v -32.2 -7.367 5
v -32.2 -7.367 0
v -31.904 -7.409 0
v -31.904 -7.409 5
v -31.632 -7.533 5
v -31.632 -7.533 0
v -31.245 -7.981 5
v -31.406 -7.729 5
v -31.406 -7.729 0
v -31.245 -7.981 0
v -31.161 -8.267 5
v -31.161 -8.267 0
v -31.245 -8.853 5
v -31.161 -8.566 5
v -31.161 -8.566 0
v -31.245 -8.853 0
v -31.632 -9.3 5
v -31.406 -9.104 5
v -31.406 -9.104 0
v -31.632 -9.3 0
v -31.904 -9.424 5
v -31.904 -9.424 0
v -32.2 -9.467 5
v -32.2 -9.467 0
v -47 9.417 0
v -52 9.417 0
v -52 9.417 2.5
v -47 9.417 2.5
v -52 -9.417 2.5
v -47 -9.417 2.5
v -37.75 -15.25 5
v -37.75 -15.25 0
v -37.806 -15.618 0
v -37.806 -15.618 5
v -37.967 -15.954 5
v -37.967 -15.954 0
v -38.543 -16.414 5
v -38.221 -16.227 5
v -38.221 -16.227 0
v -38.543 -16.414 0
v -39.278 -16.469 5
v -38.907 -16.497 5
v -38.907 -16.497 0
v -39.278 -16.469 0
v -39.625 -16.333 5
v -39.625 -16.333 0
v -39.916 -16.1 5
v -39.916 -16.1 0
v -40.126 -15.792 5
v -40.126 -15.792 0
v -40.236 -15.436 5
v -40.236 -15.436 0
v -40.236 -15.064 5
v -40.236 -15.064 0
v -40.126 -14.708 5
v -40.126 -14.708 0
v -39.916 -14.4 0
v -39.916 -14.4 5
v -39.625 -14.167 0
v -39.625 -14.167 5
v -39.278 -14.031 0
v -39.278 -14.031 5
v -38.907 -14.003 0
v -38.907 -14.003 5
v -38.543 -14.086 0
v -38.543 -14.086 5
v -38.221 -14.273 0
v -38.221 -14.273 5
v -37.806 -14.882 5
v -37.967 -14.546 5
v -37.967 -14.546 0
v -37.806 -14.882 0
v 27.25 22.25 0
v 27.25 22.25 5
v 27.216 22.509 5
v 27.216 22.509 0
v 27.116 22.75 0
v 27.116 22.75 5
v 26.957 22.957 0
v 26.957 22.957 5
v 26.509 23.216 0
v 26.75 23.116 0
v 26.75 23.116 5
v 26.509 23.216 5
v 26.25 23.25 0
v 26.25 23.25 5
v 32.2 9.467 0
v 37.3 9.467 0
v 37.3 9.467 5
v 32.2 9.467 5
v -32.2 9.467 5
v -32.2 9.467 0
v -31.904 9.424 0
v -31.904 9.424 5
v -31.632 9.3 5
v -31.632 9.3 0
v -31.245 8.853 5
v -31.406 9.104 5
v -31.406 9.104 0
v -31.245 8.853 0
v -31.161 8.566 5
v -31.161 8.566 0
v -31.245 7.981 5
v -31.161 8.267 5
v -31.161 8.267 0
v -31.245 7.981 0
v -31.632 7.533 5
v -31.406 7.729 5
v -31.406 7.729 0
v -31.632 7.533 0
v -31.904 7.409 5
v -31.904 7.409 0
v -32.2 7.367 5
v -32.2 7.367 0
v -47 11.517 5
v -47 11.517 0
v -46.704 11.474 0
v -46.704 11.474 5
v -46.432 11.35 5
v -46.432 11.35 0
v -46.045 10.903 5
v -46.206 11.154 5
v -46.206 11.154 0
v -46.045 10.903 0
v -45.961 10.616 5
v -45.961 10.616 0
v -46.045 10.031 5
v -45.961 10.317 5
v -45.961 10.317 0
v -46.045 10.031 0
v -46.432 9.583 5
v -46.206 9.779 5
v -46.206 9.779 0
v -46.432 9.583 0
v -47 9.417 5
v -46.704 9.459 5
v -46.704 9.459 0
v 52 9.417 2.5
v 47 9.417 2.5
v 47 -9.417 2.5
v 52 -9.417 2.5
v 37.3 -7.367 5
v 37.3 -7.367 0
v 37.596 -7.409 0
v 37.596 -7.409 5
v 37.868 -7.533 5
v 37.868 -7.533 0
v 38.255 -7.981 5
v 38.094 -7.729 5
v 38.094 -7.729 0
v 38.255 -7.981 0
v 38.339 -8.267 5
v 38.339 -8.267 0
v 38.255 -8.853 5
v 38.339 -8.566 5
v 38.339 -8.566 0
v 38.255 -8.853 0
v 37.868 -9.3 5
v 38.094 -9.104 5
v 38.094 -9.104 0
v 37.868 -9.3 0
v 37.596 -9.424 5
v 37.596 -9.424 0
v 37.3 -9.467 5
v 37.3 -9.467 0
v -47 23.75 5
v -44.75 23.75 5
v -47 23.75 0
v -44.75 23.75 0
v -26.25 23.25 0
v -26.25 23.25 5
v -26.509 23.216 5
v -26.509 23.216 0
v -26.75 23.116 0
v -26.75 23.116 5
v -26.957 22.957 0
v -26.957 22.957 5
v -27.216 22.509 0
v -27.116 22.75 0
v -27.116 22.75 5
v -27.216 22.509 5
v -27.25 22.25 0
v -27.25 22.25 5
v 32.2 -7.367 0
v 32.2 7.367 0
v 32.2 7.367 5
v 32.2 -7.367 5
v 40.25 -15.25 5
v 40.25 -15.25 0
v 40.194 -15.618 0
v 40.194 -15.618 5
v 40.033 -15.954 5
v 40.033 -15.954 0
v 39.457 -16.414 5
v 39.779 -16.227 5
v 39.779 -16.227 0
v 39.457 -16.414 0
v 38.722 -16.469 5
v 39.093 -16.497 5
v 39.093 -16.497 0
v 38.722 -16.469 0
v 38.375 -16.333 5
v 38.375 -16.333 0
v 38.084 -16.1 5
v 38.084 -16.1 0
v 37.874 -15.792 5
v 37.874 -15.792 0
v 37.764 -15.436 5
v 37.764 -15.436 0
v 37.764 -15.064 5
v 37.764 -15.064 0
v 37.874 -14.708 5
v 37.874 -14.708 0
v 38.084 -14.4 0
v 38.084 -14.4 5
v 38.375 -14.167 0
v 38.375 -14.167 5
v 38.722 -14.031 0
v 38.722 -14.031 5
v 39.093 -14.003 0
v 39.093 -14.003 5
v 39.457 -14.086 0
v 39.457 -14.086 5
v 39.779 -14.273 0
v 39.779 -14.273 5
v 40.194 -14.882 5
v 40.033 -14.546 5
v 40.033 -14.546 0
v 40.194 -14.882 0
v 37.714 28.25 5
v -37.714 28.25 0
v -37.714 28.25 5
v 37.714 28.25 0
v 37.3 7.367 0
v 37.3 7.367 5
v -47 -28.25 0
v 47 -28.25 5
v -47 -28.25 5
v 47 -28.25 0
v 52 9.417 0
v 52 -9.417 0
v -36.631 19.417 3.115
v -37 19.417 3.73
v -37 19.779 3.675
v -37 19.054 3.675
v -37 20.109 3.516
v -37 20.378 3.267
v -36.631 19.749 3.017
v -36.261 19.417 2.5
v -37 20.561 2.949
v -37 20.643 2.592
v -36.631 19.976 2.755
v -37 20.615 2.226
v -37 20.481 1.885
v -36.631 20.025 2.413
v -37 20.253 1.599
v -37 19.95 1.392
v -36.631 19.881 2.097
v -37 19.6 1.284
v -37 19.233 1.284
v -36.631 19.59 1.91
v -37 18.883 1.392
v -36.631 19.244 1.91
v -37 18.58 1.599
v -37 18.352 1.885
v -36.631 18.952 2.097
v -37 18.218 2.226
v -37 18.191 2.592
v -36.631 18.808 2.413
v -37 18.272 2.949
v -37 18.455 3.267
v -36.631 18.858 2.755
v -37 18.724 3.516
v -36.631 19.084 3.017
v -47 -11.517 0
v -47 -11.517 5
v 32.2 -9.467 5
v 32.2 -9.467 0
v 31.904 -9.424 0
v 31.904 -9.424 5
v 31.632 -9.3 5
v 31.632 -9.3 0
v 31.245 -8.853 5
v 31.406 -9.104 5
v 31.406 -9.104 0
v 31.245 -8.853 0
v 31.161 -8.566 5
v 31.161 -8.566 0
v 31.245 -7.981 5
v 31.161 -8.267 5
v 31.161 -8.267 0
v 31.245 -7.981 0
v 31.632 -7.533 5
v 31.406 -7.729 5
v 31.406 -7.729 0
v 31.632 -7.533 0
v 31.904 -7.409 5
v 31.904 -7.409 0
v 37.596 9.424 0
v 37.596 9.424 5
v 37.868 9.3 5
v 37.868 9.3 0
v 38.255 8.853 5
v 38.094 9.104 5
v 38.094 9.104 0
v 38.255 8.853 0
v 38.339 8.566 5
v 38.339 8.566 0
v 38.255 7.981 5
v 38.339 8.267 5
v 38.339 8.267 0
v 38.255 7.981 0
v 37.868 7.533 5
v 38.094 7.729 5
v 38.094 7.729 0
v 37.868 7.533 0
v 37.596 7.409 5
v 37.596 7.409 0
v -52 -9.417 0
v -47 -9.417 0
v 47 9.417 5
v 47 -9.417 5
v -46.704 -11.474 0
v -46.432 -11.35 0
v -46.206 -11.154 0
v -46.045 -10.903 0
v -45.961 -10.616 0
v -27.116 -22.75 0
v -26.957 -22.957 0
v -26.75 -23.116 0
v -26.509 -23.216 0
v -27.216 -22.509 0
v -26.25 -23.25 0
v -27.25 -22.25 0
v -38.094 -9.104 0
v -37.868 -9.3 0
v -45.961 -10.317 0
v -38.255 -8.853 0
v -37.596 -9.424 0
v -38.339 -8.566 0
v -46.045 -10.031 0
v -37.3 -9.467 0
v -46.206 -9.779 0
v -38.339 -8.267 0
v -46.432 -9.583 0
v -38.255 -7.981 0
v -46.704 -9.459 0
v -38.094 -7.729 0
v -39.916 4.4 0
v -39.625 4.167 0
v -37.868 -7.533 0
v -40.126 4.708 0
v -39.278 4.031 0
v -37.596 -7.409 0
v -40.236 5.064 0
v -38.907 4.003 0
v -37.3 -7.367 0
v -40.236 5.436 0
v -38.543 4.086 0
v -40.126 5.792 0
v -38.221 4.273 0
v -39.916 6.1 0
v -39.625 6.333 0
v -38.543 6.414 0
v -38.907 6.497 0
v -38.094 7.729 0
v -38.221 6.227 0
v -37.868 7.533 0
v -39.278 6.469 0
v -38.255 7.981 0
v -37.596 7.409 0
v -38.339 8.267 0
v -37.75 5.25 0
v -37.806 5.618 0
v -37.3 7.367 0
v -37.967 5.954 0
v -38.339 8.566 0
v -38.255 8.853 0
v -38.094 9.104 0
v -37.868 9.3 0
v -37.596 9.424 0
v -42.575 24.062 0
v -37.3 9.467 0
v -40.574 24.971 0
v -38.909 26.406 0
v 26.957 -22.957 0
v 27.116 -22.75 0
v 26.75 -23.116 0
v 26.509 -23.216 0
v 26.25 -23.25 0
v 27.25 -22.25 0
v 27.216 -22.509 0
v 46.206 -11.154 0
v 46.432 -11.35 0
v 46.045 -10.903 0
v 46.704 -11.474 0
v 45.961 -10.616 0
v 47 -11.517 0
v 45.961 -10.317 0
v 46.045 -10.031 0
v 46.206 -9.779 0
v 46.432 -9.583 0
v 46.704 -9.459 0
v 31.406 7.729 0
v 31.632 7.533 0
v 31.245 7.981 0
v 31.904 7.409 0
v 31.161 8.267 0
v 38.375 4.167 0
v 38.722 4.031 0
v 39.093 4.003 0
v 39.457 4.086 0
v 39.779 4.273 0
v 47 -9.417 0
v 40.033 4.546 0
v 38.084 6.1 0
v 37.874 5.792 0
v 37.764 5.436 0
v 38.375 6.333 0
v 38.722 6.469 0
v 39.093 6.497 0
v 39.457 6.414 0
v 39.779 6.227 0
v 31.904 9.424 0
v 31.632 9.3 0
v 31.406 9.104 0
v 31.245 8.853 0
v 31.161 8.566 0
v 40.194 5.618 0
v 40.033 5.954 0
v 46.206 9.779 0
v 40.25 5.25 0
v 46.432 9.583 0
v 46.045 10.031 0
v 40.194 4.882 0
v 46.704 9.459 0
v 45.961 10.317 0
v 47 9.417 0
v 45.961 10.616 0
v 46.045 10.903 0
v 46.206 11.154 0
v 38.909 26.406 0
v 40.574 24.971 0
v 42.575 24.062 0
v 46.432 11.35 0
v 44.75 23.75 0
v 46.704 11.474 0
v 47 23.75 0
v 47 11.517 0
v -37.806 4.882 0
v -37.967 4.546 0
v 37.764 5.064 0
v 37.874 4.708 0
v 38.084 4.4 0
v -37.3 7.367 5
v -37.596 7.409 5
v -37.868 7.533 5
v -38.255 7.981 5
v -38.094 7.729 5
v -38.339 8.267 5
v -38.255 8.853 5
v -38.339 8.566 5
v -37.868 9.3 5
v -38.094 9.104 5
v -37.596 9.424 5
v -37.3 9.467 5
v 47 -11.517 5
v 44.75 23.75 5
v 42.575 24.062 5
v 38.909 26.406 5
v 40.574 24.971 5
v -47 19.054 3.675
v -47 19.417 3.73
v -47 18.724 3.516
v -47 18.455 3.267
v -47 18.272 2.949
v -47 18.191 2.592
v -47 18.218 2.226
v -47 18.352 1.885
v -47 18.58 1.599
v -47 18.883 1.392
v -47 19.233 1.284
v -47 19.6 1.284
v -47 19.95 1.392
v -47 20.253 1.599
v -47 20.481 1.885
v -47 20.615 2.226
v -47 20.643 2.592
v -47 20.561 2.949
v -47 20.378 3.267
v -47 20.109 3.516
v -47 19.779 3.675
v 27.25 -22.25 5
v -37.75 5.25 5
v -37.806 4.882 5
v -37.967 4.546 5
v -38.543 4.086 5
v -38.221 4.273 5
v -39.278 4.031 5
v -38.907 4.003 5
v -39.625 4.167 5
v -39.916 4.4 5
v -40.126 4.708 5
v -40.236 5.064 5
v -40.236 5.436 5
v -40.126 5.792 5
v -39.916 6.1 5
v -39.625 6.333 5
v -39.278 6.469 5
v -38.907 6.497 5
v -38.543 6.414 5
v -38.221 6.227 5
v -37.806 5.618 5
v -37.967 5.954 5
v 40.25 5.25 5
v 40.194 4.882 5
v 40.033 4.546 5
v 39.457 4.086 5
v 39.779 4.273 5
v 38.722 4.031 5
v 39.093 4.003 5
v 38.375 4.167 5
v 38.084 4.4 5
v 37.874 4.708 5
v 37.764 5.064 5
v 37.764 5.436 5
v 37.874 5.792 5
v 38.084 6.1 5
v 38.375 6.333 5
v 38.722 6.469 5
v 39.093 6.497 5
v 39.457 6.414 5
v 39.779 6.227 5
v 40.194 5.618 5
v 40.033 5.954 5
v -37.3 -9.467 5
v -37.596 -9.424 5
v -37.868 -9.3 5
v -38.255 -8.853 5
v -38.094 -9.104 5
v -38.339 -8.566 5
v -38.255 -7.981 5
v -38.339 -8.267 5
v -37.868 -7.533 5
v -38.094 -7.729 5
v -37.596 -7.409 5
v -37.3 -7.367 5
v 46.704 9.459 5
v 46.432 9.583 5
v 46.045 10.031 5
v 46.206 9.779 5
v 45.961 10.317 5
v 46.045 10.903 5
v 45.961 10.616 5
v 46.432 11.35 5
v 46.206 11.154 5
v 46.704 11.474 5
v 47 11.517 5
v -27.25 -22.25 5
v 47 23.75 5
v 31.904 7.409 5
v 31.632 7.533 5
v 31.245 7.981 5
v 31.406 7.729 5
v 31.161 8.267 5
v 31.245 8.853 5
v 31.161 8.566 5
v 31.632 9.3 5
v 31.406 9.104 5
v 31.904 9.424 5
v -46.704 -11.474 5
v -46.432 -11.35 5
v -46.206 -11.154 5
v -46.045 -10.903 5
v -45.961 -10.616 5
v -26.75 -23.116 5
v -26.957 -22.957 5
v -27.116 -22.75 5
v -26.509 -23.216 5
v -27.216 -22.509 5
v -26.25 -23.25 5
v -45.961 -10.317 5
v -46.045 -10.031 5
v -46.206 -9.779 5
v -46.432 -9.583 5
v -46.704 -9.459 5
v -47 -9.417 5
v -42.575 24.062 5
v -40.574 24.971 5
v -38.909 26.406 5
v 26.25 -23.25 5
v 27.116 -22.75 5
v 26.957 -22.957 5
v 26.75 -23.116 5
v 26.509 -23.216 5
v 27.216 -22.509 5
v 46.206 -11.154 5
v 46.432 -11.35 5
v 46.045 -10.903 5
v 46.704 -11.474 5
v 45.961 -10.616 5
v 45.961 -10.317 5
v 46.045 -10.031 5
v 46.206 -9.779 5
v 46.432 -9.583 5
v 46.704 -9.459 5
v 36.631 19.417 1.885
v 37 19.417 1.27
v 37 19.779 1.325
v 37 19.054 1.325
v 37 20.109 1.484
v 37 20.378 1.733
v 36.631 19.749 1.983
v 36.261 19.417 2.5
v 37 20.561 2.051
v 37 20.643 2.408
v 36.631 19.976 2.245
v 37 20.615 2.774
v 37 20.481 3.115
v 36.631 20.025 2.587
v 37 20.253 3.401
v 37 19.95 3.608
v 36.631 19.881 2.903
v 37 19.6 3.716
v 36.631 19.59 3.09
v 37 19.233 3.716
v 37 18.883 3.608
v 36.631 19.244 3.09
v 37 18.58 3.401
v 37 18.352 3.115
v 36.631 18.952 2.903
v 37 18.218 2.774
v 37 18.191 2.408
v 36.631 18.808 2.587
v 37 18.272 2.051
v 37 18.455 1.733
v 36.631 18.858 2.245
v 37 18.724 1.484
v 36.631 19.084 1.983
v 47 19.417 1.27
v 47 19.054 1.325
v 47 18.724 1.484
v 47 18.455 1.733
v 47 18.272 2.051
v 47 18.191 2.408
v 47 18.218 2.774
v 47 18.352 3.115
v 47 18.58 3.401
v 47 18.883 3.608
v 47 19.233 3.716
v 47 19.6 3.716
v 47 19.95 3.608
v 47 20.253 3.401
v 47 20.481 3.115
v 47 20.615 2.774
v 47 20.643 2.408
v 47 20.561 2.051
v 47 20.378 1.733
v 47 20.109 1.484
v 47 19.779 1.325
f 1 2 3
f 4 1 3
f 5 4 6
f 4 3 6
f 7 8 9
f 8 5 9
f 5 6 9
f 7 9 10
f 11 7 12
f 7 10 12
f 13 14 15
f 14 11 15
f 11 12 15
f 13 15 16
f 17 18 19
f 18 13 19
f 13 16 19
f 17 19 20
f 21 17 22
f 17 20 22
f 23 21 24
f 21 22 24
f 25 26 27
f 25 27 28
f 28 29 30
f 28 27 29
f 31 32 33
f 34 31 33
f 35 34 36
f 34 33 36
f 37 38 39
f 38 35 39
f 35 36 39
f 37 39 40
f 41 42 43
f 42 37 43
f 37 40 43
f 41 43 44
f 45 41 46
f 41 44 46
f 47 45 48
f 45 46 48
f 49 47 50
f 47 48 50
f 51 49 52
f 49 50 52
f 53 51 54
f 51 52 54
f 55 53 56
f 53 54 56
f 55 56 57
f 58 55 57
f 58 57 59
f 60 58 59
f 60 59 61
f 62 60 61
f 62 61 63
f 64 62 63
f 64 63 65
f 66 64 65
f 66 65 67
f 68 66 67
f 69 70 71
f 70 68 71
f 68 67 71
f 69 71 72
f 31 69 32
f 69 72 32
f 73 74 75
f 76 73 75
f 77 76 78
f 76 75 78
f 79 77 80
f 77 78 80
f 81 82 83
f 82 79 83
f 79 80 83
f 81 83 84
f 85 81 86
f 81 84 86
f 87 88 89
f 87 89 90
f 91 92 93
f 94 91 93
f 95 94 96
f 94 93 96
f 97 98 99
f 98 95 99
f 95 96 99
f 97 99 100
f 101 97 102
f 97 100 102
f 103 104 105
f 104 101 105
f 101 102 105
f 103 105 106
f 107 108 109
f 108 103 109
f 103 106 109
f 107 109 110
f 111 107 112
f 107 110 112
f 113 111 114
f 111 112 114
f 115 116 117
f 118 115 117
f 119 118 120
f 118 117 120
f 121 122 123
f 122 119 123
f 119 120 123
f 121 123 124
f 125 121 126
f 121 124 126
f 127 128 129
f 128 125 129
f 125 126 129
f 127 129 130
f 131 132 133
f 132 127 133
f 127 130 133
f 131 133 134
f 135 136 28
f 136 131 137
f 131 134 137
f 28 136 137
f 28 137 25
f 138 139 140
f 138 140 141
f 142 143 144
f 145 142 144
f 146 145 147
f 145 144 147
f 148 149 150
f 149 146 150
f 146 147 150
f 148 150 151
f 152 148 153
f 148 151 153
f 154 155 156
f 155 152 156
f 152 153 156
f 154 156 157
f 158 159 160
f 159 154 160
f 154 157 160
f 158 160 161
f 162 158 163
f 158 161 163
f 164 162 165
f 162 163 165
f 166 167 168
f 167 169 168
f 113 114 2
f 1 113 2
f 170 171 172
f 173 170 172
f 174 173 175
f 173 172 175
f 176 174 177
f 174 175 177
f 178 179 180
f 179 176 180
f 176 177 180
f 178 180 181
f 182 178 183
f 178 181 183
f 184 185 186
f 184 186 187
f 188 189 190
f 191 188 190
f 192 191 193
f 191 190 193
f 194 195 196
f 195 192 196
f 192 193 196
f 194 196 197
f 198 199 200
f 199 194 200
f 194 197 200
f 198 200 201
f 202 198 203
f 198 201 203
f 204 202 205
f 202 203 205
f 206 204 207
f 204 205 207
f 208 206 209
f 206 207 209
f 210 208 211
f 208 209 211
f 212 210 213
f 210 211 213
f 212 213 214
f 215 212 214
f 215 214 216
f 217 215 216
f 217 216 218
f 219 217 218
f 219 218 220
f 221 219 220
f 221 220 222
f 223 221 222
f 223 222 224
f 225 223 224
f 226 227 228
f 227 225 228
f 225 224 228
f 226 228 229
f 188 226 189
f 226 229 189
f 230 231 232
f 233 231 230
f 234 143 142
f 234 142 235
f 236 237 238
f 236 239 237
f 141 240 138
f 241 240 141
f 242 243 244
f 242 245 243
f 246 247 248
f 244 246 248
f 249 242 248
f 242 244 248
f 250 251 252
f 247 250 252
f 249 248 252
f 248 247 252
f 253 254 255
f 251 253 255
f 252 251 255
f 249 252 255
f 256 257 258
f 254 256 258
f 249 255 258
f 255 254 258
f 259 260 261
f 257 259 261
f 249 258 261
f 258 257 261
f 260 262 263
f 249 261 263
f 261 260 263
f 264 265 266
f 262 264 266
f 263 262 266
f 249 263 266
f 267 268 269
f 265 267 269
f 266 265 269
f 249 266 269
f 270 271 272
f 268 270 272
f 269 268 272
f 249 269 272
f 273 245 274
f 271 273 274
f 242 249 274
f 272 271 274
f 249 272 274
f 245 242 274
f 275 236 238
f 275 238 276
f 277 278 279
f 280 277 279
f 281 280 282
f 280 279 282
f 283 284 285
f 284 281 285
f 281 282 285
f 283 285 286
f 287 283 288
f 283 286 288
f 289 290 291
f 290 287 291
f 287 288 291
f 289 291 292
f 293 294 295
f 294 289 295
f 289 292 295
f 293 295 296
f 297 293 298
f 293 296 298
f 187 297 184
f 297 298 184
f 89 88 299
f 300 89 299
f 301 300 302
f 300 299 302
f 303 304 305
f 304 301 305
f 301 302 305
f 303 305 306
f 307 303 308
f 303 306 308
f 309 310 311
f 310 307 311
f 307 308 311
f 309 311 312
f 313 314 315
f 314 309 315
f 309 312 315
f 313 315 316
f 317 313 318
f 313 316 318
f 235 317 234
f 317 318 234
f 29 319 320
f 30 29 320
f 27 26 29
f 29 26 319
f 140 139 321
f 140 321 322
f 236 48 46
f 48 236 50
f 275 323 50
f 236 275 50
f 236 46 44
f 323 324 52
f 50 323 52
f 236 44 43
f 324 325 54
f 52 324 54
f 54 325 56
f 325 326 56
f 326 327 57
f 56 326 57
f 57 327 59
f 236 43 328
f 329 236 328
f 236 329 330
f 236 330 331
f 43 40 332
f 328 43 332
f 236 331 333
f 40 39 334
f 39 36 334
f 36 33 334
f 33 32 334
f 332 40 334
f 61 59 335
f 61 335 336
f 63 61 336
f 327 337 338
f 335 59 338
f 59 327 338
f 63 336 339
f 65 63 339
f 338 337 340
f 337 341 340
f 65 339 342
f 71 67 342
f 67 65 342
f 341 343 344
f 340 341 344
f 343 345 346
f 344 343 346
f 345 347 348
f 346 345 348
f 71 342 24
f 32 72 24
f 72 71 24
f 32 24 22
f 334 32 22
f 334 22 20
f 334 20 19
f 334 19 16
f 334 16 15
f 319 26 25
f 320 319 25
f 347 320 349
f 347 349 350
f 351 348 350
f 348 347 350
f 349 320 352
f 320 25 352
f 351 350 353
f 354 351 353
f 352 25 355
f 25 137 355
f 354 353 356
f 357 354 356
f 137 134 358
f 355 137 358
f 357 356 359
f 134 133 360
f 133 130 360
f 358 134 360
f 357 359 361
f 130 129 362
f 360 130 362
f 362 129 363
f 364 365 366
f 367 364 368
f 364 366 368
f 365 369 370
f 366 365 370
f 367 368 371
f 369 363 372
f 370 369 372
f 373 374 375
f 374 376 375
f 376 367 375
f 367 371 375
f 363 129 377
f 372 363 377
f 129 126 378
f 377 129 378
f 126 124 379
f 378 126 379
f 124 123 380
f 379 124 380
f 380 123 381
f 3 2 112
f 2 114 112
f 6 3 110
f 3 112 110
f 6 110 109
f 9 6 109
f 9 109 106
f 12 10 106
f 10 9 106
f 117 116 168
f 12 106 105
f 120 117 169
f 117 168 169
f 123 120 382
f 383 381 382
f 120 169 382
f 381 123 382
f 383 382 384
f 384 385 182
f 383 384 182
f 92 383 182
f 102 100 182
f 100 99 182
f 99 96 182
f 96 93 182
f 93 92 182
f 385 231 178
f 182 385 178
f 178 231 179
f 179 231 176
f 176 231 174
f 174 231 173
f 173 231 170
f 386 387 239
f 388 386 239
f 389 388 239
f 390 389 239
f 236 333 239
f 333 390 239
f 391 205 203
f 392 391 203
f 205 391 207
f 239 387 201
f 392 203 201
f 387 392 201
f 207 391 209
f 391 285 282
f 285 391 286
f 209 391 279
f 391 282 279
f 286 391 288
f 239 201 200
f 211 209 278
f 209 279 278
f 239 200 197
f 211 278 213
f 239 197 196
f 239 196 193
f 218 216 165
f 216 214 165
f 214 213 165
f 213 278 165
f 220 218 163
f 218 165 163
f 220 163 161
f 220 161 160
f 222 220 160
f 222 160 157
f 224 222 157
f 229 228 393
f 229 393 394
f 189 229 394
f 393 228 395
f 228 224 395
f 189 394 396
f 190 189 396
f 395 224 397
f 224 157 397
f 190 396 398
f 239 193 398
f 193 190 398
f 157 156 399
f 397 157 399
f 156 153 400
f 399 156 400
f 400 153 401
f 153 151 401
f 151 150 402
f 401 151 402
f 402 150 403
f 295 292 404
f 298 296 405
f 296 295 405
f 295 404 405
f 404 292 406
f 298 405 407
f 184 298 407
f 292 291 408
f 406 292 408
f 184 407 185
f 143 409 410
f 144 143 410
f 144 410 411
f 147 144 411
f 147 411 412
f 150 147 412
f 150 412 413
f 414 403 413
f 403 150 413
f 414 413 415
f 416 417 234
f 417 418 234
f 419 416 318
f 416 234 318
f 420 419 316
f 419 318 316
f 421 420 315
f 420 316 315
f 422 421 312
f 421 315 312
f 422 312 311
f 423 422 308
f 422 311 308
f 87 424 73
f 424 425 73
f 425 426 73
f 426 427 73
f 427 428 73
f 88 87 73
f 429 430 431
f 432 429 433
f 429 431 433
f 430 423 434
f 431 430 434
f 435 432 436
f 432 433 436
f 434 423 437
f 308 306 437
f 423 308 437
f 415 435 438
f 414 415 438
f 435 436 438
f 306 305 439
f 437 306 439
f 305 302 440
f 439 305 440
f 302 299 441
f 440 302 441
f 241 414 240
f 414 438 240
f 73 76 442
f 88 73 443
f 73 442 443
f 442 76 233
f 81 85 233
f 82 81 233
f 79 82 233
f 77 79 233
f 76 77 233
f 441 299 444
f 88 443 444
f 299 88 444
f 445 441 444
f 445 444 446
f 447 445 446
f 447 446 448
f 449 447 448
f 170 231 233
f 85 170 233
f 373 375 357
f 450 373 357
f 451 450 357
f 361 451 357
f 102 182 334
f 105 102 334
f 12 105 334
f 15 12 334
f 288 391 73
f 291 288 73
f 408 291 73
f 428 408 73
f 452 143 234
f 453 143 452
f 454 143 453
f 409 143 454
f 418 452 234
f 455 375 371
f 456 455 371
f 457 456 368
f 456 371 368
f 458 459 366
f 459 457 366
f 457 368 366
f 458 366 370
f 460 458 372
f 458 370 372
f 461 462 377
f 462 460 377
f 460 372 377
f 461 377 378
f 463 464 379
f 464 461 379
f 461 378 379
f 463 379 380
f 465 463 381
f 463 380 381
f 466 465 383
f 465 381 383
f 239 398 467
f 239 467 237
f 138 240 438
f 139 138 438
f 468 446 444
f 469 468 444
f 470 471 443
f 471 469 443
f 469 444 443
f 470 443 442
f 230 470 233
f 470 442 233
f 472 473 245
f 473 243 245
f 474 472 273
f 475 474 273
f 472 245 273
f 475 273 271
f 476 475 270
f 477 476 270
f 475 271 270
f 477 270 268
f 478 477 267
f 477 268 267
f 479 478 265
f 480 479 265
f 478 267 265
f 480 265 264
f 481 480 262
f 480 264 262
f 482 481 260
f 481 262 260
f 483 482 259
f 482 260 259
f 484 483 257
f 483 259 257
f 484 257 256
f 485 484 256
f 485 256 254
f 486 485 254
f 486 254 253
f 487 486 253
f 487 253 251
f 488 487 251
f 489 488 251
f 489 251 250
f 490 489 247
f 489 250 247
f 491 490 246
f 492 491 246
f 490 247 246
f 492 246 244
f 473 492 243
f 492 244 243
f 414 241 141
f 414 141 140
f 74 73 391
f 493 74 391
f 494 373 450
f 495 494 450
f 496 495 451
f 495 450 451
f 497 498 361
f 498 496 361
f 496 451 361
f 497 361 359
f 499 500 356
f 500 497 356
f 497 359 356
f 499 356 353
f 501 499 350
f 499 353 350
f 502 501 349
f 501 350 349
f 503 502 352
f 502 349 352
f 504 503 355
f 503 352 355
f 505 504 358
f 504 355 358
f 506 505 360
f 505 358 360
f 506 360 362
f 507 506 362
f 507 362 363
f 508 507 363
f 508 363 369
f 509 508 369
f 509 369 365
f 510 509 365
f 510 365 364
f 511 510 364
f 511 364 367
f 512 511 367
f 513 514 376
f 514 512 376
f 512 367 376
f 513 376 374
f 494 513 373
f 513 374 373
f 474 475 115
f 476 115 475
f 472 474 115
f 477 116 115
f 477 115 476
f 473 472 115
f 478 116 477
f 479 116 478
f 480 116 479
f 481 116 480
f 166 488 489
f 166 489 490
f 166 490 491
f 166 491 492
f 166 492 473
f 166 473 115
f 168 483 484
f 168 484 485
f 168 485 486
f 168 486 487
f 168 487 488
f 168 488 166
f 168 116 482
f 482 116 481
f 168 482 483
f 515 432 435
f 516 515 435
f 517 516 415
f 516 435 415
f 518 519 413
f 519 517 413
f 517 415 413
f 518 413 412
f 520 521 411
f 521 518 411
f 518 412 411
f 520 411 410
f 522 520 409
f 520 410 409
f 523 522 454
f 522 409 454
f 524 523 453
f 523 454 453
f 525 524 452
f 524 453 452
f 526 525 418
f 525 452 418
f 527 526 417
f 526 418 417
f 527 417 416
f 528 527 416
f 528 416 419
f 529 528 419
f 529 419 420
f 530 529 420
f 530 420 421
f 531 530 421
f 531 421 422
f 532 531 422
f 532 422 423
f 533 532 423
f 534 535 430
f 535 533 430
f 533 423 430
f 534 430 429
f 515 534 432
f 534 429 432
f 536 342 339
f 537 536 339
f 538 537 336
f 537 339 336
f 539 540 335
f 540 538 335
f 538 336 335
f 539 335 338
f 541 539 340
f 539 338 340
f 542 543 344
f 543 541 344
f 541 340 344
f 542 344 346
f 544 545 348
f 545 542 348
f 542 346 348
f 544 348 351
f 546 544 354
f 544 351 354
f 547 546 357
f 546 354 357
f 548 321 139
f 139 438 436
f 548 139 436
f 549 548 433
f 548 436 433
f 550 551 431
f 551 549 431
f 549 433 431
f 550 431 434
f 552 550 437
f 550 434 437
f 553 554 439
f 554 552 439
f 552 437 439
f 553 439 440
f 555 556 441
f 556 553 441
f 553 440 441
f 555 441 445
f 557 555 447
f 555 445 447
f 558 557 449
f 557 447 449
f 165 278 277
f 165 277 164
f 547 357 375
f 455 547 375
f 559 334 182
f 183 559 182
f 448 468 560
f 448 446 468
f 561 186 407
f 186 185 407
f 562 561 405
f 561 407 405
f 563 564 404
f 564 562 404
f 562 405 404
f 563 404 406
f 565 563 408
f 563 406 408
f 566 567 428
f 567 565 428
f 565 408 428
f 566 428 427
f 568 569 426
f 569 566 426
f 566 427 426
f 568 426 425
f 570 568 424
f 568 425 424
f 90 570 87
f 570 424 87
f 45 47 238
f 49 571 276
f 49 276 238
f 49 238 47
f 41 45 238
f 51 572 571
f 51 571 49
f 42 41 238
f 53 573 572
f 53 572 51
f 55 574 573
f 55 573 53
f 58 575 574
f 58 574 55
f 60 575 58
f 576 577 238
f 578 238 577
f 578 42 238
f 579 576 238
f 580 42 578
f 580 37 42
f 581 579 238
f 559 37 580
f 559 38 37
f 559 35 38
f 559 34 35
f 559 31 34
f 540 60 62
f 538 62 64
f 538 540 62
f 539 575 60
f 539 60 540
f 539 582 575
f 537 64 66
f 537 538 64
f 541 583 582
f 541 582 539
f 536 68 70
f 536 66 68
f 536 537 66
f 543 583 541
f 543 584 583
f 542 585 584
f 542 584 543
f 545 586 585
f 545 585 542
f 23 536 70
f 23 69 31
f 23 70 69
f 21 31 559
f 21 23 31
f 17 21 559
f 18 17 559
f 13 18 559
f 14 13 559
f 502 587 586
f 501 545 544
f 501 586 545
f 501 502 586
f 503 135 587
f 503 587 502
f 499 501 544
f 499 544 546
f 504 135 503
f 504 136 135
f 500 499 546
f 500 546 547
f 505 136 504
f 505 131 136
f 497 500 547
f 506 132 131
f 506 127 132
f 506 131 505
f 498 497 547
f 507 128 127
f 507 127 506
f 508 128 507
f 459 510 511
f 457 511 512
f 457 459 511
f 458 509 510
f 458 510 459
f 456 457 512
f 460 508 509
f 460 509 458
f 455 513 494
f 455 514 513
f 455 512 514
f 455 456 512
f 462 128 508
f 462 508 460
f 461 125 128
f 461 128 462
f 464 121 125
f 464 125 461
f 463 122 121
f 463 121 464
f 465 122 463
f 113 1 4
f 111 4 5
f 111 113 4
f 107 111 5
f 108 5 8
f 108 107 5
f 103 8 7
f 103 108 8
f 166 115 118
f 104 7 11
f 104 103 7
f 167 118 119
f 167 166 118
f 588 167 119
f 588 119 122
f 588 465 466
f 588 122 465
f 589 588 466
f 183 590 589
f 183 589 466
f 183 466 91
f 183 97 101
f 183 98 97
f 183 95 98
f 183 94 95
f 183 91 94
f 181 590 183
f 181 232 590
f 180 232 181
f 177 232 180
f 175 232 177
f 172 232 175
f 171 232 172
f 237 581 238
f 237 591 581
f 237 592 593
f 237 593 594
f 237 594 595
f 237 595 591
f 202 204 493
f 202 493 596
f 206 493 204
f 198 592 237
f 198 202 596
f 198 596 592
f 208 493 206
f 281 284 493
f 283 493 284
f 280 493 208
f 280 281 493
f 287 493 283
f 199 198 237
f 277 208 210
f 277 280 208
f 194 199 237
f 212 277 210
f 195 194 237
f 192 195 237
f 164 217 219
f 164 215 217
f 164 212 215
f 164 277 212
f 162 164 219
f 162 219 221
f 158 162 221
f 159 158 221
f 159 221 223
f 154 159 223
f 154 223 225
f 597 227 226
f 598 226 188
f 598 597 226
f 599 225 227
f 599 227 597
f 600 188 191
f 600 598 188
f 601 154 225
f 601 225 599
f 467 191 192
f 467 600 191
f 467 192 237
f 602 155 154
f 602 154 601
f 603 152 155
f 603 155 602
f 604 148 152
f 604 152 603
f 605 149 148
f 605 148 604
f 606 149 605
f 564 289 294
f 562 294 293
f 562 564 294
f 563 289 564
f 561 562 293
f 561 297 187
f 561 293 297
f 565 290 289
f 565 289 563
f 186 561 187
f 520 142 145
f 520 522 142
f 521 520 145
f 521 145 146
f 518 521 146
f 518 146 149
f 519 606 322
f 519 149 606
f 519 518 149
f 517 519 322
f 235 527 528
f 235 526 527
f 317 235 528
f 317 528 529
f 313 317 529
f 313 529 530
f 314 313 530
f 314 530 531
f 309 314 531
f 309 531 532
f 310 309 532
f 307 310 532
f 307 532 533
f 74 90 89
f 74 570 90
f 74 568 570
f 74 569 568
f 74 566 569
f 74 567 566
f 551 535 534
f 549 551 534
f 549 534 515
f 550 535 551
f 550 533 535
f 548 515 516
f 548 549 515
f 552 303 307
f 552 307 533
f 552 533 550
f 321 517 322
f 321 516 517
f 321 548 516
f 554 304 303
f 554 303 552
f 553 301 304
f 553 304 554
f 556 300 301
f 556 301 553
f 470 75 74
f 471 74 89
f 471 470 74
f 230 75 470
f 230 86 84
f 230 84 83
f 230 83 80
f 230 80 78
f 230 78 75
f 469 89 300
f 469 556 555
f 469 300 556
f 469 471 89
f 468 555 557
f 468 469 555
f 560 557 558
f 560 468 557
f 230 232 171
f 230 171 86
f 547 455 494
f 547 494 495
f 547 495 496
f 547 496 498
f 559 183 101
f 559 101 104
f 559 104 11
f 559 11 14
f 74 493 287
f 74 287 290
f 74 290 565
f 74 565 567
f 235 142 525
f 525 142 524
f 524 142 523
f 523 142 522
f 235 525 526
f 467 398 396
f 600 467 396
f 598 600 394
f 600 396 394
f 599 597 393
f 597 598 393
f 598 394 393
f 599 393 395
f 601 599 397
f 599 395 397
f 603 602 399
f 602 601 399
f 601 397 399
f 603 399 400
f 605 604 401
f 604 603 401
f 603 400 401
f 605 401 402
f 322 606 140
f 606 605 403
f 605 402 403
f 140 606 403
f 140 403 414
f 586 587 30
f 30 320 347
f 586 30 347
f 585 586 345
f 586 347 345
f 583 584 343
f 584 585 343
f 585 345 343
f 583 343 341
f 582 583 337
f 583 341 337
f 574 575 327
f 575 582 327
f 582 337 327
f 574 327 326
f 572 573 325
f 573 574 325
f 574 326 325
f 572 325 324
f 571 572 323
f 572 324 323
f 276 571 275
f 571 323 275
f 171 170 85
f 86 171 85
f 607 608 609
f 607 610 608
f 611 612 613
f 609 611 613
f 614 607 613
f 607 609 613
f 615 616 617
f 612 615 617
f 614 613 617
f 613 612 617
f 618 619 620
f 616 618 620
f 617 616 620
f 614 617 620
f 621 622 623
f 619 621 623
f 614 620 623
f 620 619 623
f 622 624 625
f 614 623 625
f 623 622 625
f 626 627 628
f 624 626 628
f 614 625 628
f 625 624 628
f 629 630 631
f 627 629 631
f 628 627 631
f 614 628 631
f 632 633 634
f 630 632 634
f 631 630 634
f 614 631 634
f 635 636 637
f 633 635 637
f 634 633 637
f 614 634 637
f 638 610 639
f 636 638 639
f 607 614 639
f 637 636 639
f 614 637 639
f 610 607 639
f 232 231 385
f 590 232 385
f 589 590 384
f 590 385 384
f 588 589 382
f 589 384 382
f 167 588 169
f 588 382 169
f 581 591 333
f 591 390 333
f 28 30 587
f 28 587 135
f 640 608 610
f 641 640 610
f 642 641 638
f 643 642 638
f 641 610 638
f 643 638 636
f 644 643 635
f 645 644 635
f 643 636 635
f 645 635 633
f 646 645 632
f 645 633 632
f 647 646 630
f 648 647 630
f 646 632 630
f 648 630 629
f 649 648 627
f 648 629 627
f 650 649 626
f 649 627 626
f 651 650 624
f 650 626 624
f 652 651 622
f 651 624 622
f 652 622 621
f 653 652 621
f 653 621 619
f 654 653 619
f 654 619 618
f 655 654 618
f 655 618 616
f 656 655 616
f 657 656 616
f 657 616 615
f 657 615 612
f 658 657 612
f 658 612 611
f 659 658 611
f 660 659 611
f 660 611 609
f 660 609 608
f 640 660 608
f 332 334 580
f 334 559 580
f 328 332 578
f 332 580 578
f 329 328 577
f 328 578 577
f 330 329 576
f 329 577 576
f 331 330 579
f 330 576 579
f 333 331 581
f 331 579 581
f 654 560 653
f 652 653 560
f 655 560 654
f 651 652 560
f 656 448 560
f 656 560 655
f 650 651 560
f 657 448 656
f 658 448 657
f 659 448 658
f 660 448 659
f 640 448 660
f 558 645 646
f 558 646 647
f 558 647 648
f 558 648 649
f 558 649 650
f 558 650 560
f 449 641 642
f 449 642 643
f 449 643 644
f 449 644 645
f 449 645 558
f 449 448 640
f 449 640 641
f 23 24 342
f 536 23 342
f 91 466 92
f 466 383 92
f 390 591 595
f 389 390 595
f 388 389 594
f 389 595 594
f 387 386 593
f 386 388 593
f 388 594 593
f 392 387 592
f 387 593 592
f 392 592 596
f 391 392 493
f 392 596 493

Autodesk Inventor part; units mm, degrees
ref_plane "YZ Plane" through (0, 0, 0) normal (1, 0, 0) x (0, 1, 0)
ref_plane "XZ Plane" through (0, 0, 0) normal (0, 1, 0) x (-1, 0, 0)
ref_plane "XY Plane" through (0, 0, 0) normal (0, 0, 1) x (1, 0, 0)
sketch "スケッチ1" plane through (0, 0, 0) normal (0, 0, 1) x (1, 0, 0)
  line L0 (-47, 28.25) -> (-37.7144, 28.25)
  line L1 (47, 28.25) -> (47, 23.75)
  line L2 (47, -28.25) -> (-47, -28.25)
  line L3 (-47, -28.25) -> (-47, -11.5167)
  line L4 (-47, 28.25) -> (47, -28.25) construction
  line L5 (47, 28.25) -> (-47, -28.25) construction
  line L6 (0, 28.25) -> (0, -28.25) construction
  line L7 (-37.25, 9.4167) -> (-32.25, 9.4167) construction
  line L8 (-32.25, 9.4167) -> (-32.25, -9.4167) construction
  line L9 (-32.25, -9.4167) -> (-37.25, -9.4167) construction
  line L10 (-37.25, -9.4167) -> (-37.25, 9.4167) construction
  line L11 (-37.25, 9.4167) -> (-32.25, -9.4167) construction
  line L12 (-32.25, 9.4167) -> (-37.25, -9.4167) construction
  line L13 (-37.3, 9.4667) -> (-32.2, 9.4667)
  line L14 (-32.2, 9.4667) -> (-32.2, 7.3667) construction
  line L15 (-32.2, -9.4667) -> (-37.3, -9.4667)
  line L16 (-37.3, -9.4667) -> (-37.3, -7.3667) construction
  line L17 (-37.3, 9.4667) -> (-32.2, -9.4667) construction
  line L18 (-32.2, 9.4667) -> (-37.3, -9.4667) construction
  arc A0 (-37.3, 9.4667) -> (-37.3, 7.3667) centre (-37.3, 8.4167) ccw
  line L19 (-34.75, 9.4667) -> (-34.75, -9.4667) construction
  arc A1 (-32.2, 7.3667) -> (-32.2, 9.4667) centre (-32.2, 8.4167) ccw
  line L20 (-37.3, 7.3667) -> (-37.3, 9.4667) construction
  line L21 (-32.2, 7.3667) -> (-32.2, -7.3667)
  line L22 (-37.3, -7.3667) -> (-37.3, 7.3667)
  line L23 (-32.2, -7.3667) -> (-32.2, -9.4667) construction
  line L24 (37.25, 9.4167) -> (32.25, 9.4167) construction
  line L25 (32.25, 9.4167) -> (32.25, -9.4167) construction
  line L26 (32.25, -9.4167) -> (37.25, -9.4167) construction
  line L27 (37.25, -9.4167) -> (37.25, 9.4167) construction
  line L28 (37.25, 9.4167) -> (32.25, -9.4167) construction
  line L29 (32.25, 9.4167) -> (37.25, -9.4167) construction
  line L30 (37.3, 9.4667) -> (32.2, 9.4667)
  line L31 (32.2, 9.4667) -> (32.2, 7.3667) construction
  line L32 (32.2, -9.4667) -> (37.3, -9.4667)
  line L33 (37.3, -9.4667) -> (37.3, -7.3667) construction
  line L34 (37.3, 9.4667) -> (32.2, -9.4667) construction
  line L35 (32.2, 9.4667) -> (37.3, -9.4667) construction
  arc A2 (37.3, 7.3667) -> (37.3, 9.4667) centre (37.3, 8.4167) ccw
  line L36 (34.75, 9.4667) -> (34.75, -9.4667) construction
  arc A3 (32.2, 9.4667) -> (32.2, 7.3667) centre (32.2, 8.4167) ccw
  line L37 (37.3, 7.3667) -> (37.3, 9.4667) construction
  line L38 (32.2, 7.3667) -> (32.2, -7.3667)
  line L39 (37.3, -7.3667) -> (37.3, 7.3667)
  line L40 (32.2, -7.3667) -> (32.2, -9.4667) construction
  line L41 (-52, 9.4167) -> (-52, -9.4167)
  line L42 (-52, 9.4167) -> (-47, 9.4167)
  arc A4 (-47, 9.4167) -> (-47, 11.5167) centre (-47, 10.4667) ccw
  line L43 (-47, 11.5167) -> (-47, 23.75)
  line L44 (-47, -11.5167) -> (-47, 11.5167)
  line L45 (52, 9.4167) -> (52, -9.4167)
  line L46 (52, 9.4167) -> (47, 9.4167)
  arc A5 (47, 11.5167) -> (47, 9.4167) centre (47, 10.4667) ccw
  line L47 (47, 11.5167) -> (47, -11.5167)
  line L48 (47, -11.5167) -> (47, -28.25)
  line L49 (-52, 0) -> (52, 0) construction
  line L50 (-52, -9.4167) -> (-47, -9.4167)
  arc A6 (-47, -11.5167) -> (-47, -9.4167) centre (-47, -10.4667) ccw
  arc A7 (47, -9.4167) -> (47, -11.5167) centre (47, -10.4667) ccw
  line L51 (52, -9.4167) -> (47, -9.4167)
  line L52 (-37.3, 0) -> (-32.2, 0) construction
  arc A8 (-37.3, -7.3667) -> (-37.3, -9.4667) centre (-37.3, -8.4167) ccw
  arc A9 (-32.2, -9.4667) -> (-32.2, -7.3667) centre (-32.2, -8.4167) ccw
  arc A10 (32.2, -7.3667) -> (32.2, -9.4667) centre (32.2, -8.4167) ccw
  arc A11 (37.3, -9.4667) -> (37.3, -7.3667) centre (37.3, -8.4167) ccw
  arc A12 (-47, 24.0838) -> (-37.7144, 28.25) centre (-44.75, 31.5) ccw
  arc A13 (37.7144, 28.25) -> (47, 24.0838) centre (44.75, 31.5) ccw
  line L53 (-47, 24.0838) -> (-47, 28.25)
  line L54 (-37.7144, 28.25) -> (47, 28.25)
  arc A14 (-37.7144, 28.25) -> (-47, 24.0838) centre (-44.75, 31.5) ccw
  arc A15 (47, 24.0838) -> (37.7144, 28.25) centre (44.75, 31.5) ccw
  line L55 (-44.75, 23.75) -> (-47, 23.75)
  line L56 (44.75, 23.75) -> (47, 23.75)
  line L57 (-47, 23.75) -> (-47, 24.0838)
  line L58 (47, 23.75) -> (47, 11.5167)
  line L59 (-27.25, 23.25) -> (27.25, 23.25)
  line L60 (27.25, 23.25) -> (27.25, -23.25)
  line L61 (27.25, -23.25) -> (-27.25, -23.25)
  line L62 (-27.25, -23.25) -> (-27.25, 23.25)
  line L63 (-27.25, 23.25) -> (27.25, -23.25) construction
  line L64 (27.25, 23.25) -> (-27.25, -23.25) construction
  line L65 (-42, 8.25) -> (42, 8.25) construction
  line L66 (42, 8.25) -> (42, -18.25) construction
  line L67 (42, -18.25) -> (-42, -18.25) construction
  line L68 (-42, -18.25) -> (-42, 8.25) construction
  line L69 (-42, 8.25) -> (42, -18.25) construction
  line L70 (42, 8.25) -> (-42, -18.25) construction
  circle A16 centre (-39, 5.25) radius 1.25
  line L71 (-42, -5) -> (42, -5) construction
  circle A17 centre (-39, -15.25) radius 1.25
  circle A18 centre (39, 5.25) radius 1.25
  circle A19 centre (39, -15.25) radius 1.25
  point P0 (0, 0)
  point P1 (-34.75, 0)
  point P2 (34.75, 0)
  point P3 (0, 0)
  point P4 (-34.75, 0)
  point P5 (-34.75, 0)
  point P6 (0, 0)
  point P7 (0, 0)
  point P8 (47, 9.4167)
  point P9 (47, 9.4167)
  point P10 (0, -5)
  point P11 (0, -5)
  dimension "d57" = 90
  dimension "d0" = 94
  dimension "d1" = 56.5
  dimension "d2" = 5
  dimension "d3" = 18.8333
  dimension "d4" = 1.05
  dimension "d5" = 0.05
  dimension "d6" = 0.05
  dimension "d7" = 64.5
  dimension "d10" = 1.05
  dimension "d11" = 5
  dimension "d34" = 18.8333
  dimension "d40" = 31.5
  dimension "d41" = 89.5
  dimension "d42" = 15.5
  dimension "d43" = 52
  dimension "d60" = 5
  dimension "d63" = 5
  dimension "d69" = 5
  dimension "d70" = 20
  dimension "d71" = 10
  dimension "d72" = 84
  dimension "d73" = 26.5
  dimension "d78" = 2.5
  dimension "d80" = 3
  dimension "d81" = 3
extrude "押し出し1" add sketch "スケッチ1" along normal blind 5 contours L54 A13 L56 L58 A5 L47 A7 L48 L2 L3 A6 L44 A4 L43 L55 A12
extrude "押し出し2" add sketch "スケッチ1" along normal blind 2.5 contours L44 L50 L41 L42 | L46 L45 L51 L47
sketch "スケッチ2" plane through (47, 11.5167, 0) normal (1, 0, 0) x (0, 0, -1)
  line L0 (0, -23.0333) -> (-5, -23.0333) projected
  line L1 (-2.5, -23.0333) -> (-2.5, -39.7667)
  line L2 (0, -39.7667) -> (-5, -39.7667) projected
  line L3 (0, -2.1) -> (-2.5, -2.1) projected
  line L4 (0, -20.9333) -> (-2.5, -20.9333) projected
  point P0 (0, -11.5167)
  point P1 (-2.5, 7.9)
  dimension "d67" = 10
hole "穴1" at (47, 19.4167, 2.5) direction (-1, 0, 0) diameter 2.459 depth 10 tip angle 118 thread size "M3x0.5" class "6H" standard "ANSI Metric M Profile"
sketch "スケッチ3" plane through (-47, 11.5167, 0) normal (-1, 0, 0) x (0, 0, 1)
  circle A0 centre (2.5, 7.9) radius 1.2295 projected
  circle A1 centre (2.5, -30.9333) radius 1.2295 projected
  point P0 (0, -11.5167)
  point P1 (2.5, 7.9)
hole "穴2" at (-47, 19.4167, 2.5) direction (1, 0, 0) diameter 2.459 depth 10 tip angle 118 thread size "M3x0.5" class "6H" standard "ANSI Metric M Profile"
fillet "フィレット1" radius 1 4 edges at (-27.25, 23.25, 2.5) (-27.25, -23.25, 2.5) (27.25, -23.25, 2.5) (27.25, 23.25, 2.5)
equation "\"d3\" = d34"
equation "\"d6\" = d5"
equation "\"d10\" = d4"
properties part number "Cockpit_horizontal_frame_04" material "アセタール樹脂、黒"
